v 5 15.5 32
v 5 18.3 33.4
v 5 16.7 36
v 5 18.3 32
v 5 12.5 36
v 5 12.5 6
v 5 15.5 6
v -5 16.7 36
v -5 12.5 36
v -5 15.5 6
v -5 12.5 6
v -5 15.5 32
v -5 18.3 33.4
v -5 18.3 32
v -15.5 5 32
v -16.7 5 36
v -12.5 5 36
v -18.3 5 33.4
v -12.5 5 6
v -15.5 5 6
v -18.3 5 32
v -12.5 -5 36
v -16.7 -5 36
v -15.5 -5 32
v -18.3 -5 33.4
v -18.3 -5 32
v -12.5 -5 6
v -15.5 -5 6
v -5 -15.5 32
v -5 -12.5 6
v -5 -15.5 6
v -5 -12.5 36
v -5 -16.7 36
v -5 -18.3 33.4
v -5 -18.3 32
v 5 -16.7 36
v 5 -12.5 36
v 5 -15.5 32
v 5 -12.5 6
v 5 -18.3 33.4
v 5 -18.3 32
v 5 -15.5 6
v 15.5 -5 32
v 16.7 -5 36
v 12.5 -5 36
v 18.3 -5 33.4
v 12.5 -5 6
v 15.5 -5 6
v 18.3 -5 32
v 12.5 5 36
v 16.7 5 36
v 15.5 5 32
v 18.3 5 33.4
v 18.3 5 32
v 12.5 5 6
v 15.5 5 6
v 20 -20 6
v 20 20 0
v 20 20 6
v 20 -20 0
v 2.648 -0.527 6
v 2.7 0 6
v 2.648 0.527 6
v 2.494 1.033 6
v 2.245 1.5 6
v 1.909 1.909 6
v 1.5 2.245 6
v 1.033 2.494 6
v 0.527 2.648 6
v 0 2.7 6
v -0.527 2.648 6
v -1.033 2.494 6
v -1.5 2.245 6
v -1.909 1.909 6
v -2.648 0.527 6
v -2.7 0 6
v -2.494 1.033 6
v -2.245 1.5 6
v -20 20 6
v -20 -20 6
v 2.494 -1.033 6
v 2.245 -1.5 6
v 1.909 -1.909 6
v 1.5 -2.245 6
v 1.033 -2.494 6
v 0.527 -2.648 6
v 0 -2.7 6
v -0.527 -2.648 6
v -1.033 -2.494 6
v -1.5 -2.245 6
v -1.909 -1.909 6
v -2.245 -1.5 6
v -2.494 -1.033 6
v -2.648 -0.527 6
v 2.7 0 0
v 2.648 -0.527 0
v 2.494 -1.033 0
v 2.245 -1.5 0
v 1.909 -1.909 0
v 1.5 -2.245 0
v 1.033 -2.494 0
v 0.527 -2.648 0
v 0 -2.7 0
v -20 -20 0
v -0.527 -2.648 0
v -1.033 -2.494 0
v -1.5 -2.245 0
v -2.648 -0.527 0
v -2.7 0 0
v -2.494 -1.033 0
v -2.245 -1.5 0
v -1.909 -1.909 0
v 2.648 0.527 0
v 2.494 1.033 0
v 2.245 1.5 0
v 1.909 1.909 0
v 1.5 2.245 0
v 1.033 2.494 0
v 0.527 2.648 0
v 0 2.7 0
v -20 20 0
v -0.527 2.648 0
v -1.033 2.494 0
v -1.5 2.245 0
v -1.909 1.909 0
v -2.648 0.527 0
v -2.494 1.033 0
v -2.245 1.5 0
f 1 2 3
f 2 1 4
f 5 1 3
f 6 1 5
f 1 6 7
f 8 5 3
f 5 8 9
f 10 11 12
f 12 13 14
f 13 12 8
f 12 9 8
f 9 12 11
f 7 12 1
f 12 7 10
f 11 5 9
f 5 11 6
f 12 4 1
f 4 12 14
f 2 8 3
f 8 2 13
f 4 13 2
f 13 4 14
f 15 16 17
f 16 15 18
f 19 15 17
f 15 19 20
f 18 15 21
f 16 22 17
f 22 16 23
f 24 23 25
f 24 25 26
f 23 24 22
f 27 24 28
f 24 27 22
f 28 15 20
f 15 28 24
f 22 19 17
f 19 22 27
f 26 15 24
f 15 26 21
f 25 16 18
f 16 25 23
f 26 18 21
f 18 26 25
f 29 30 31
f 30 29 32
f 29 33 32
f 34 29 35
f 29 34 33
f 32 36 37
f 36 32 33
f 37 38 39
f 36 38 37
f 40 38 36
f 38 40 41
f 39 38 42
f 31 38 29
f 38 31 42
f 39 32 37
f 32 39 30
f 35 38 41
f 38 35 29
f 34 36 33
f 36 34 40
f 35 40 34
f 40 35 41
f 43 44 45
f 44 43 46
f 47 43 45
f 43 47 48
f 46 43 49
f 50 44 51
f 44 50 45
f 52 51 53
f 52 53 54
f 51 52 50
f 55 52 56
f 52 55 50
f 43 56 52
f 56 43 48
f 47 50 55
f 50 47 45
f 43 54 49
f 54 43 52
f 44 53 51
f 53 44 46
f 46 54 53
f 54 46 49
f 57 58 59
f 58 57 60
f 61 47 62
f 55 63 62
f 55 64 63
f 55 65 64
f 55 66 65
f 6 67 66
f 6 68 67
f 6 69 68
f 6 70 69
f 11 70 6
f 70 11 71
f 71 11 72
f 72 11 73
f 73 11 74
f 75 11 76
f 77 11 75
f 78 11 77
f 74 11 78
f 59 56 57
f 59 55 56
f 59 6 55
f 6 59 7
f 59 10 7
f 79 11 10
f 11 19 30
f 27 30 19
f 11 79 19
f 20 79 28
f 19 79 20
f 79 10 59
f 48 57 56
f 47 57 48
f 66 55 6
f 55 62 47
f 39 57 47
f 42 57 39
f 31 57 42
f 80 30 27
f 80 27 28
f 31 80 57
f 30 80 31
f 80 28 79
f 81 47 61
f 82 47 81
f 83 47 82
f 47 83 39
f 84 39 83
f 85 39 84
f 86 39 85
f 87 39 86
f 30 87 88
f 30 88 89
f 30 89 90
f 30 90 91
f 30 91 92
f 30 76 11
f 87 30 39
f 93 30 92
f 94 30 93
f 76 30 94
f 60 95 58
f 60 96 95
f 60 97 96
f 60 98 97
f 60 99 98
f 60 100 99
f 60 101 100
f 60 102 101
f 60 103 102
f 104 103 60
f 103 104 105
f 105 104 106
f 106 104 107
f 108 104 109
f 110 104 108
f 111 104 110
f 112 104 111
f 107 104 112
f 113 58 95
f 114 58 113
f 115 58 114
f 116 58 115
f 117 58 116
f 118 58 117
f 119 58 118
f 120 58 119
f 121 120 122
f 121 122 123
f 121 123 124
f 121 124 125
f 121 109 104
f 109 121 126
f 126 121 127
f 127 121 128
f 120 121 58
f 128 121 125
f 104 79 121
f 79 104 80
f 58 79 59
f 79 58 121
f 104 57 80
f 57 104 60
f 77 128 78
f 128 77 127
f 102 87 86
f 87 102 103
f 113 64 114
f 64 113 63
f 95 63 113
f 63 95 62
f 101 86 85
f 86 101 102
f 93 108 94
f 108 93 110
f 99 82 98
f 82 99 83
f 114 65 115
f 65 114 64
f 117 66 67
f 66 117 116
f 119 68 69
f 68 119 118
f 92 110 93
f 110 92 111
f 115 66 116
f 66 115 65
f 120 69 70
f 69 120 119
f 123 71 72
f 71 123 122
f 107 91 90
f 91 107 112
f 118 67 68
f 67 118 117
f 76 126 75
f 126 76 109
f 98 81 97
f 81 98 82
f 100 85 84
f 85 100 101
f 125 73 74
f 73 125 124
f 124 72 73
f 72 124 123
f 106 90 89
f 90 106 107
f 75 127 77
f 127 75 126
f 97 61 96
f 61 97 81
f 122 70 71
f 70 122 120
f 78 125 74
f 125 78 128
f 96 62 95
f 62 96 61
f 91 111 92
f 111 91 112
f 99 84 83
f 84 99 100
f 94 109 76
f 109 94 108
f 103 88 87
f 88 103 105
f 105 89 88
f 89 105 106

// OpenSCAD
$fn = 32;

// ----------------------------------------------------------------------
// Snap-fit latch: 4 arms, 30 mm tall, 3 mm undercut hooks
// ----------------------------------------------------------------------

// --- parameters (mm) ---
base_d = 40;              // base plate depth
base_h = 6;               // base plate thickness
span = 28;                // distance between opposite arms
arm_t = 3;                // arm thickness
arm_d = 10;               // arm width
height = 30;              // free arm length
head_len = 3;             // hook reach
head_h = 4;               // hook height
lead = 1.4;               // lead-in ramp thickness
bore_d = 5.4;             // base fixing bore
top_z = 36;               // height of the arm tips above the base

arms = 4;

difference() {
  union() {
    /* base plate, centred on the arm ring */
    translate([-20, -20, 0]) cube([base_d, base_d, base_h]);
    for (a = [0 : 360 / arms : 359]) rotate([0, 0, a]) {
    /* arm, sunk 0.5 mm into the base */
    translate([-arm_d / 2, span / 2 - arm_t / 2, base_h - 0.5]) cube([arm_d, arm_t, height + 0.5]);
    /* hook: a convex hull of a tall inner block and a thin outer lip
       gives a flat undercut below and a lead-in ramp on top */
    hull() {
      translate([-arm_d / 2, span / 2 + arm_t / 2 - 0.6, top_z - head_h]) cube([arm_d, lead + 0.4, head_h]);
      translate([-arm_d / 2, span / 2 + arm_t / 2 - 0.2, top_z - head_h]) cube([arm_d, head_len, lead]);
    }
    }
  }
  translate([0, 0, -2.5]) cylinder(h = base_h + 5, d = bore_d);
}
